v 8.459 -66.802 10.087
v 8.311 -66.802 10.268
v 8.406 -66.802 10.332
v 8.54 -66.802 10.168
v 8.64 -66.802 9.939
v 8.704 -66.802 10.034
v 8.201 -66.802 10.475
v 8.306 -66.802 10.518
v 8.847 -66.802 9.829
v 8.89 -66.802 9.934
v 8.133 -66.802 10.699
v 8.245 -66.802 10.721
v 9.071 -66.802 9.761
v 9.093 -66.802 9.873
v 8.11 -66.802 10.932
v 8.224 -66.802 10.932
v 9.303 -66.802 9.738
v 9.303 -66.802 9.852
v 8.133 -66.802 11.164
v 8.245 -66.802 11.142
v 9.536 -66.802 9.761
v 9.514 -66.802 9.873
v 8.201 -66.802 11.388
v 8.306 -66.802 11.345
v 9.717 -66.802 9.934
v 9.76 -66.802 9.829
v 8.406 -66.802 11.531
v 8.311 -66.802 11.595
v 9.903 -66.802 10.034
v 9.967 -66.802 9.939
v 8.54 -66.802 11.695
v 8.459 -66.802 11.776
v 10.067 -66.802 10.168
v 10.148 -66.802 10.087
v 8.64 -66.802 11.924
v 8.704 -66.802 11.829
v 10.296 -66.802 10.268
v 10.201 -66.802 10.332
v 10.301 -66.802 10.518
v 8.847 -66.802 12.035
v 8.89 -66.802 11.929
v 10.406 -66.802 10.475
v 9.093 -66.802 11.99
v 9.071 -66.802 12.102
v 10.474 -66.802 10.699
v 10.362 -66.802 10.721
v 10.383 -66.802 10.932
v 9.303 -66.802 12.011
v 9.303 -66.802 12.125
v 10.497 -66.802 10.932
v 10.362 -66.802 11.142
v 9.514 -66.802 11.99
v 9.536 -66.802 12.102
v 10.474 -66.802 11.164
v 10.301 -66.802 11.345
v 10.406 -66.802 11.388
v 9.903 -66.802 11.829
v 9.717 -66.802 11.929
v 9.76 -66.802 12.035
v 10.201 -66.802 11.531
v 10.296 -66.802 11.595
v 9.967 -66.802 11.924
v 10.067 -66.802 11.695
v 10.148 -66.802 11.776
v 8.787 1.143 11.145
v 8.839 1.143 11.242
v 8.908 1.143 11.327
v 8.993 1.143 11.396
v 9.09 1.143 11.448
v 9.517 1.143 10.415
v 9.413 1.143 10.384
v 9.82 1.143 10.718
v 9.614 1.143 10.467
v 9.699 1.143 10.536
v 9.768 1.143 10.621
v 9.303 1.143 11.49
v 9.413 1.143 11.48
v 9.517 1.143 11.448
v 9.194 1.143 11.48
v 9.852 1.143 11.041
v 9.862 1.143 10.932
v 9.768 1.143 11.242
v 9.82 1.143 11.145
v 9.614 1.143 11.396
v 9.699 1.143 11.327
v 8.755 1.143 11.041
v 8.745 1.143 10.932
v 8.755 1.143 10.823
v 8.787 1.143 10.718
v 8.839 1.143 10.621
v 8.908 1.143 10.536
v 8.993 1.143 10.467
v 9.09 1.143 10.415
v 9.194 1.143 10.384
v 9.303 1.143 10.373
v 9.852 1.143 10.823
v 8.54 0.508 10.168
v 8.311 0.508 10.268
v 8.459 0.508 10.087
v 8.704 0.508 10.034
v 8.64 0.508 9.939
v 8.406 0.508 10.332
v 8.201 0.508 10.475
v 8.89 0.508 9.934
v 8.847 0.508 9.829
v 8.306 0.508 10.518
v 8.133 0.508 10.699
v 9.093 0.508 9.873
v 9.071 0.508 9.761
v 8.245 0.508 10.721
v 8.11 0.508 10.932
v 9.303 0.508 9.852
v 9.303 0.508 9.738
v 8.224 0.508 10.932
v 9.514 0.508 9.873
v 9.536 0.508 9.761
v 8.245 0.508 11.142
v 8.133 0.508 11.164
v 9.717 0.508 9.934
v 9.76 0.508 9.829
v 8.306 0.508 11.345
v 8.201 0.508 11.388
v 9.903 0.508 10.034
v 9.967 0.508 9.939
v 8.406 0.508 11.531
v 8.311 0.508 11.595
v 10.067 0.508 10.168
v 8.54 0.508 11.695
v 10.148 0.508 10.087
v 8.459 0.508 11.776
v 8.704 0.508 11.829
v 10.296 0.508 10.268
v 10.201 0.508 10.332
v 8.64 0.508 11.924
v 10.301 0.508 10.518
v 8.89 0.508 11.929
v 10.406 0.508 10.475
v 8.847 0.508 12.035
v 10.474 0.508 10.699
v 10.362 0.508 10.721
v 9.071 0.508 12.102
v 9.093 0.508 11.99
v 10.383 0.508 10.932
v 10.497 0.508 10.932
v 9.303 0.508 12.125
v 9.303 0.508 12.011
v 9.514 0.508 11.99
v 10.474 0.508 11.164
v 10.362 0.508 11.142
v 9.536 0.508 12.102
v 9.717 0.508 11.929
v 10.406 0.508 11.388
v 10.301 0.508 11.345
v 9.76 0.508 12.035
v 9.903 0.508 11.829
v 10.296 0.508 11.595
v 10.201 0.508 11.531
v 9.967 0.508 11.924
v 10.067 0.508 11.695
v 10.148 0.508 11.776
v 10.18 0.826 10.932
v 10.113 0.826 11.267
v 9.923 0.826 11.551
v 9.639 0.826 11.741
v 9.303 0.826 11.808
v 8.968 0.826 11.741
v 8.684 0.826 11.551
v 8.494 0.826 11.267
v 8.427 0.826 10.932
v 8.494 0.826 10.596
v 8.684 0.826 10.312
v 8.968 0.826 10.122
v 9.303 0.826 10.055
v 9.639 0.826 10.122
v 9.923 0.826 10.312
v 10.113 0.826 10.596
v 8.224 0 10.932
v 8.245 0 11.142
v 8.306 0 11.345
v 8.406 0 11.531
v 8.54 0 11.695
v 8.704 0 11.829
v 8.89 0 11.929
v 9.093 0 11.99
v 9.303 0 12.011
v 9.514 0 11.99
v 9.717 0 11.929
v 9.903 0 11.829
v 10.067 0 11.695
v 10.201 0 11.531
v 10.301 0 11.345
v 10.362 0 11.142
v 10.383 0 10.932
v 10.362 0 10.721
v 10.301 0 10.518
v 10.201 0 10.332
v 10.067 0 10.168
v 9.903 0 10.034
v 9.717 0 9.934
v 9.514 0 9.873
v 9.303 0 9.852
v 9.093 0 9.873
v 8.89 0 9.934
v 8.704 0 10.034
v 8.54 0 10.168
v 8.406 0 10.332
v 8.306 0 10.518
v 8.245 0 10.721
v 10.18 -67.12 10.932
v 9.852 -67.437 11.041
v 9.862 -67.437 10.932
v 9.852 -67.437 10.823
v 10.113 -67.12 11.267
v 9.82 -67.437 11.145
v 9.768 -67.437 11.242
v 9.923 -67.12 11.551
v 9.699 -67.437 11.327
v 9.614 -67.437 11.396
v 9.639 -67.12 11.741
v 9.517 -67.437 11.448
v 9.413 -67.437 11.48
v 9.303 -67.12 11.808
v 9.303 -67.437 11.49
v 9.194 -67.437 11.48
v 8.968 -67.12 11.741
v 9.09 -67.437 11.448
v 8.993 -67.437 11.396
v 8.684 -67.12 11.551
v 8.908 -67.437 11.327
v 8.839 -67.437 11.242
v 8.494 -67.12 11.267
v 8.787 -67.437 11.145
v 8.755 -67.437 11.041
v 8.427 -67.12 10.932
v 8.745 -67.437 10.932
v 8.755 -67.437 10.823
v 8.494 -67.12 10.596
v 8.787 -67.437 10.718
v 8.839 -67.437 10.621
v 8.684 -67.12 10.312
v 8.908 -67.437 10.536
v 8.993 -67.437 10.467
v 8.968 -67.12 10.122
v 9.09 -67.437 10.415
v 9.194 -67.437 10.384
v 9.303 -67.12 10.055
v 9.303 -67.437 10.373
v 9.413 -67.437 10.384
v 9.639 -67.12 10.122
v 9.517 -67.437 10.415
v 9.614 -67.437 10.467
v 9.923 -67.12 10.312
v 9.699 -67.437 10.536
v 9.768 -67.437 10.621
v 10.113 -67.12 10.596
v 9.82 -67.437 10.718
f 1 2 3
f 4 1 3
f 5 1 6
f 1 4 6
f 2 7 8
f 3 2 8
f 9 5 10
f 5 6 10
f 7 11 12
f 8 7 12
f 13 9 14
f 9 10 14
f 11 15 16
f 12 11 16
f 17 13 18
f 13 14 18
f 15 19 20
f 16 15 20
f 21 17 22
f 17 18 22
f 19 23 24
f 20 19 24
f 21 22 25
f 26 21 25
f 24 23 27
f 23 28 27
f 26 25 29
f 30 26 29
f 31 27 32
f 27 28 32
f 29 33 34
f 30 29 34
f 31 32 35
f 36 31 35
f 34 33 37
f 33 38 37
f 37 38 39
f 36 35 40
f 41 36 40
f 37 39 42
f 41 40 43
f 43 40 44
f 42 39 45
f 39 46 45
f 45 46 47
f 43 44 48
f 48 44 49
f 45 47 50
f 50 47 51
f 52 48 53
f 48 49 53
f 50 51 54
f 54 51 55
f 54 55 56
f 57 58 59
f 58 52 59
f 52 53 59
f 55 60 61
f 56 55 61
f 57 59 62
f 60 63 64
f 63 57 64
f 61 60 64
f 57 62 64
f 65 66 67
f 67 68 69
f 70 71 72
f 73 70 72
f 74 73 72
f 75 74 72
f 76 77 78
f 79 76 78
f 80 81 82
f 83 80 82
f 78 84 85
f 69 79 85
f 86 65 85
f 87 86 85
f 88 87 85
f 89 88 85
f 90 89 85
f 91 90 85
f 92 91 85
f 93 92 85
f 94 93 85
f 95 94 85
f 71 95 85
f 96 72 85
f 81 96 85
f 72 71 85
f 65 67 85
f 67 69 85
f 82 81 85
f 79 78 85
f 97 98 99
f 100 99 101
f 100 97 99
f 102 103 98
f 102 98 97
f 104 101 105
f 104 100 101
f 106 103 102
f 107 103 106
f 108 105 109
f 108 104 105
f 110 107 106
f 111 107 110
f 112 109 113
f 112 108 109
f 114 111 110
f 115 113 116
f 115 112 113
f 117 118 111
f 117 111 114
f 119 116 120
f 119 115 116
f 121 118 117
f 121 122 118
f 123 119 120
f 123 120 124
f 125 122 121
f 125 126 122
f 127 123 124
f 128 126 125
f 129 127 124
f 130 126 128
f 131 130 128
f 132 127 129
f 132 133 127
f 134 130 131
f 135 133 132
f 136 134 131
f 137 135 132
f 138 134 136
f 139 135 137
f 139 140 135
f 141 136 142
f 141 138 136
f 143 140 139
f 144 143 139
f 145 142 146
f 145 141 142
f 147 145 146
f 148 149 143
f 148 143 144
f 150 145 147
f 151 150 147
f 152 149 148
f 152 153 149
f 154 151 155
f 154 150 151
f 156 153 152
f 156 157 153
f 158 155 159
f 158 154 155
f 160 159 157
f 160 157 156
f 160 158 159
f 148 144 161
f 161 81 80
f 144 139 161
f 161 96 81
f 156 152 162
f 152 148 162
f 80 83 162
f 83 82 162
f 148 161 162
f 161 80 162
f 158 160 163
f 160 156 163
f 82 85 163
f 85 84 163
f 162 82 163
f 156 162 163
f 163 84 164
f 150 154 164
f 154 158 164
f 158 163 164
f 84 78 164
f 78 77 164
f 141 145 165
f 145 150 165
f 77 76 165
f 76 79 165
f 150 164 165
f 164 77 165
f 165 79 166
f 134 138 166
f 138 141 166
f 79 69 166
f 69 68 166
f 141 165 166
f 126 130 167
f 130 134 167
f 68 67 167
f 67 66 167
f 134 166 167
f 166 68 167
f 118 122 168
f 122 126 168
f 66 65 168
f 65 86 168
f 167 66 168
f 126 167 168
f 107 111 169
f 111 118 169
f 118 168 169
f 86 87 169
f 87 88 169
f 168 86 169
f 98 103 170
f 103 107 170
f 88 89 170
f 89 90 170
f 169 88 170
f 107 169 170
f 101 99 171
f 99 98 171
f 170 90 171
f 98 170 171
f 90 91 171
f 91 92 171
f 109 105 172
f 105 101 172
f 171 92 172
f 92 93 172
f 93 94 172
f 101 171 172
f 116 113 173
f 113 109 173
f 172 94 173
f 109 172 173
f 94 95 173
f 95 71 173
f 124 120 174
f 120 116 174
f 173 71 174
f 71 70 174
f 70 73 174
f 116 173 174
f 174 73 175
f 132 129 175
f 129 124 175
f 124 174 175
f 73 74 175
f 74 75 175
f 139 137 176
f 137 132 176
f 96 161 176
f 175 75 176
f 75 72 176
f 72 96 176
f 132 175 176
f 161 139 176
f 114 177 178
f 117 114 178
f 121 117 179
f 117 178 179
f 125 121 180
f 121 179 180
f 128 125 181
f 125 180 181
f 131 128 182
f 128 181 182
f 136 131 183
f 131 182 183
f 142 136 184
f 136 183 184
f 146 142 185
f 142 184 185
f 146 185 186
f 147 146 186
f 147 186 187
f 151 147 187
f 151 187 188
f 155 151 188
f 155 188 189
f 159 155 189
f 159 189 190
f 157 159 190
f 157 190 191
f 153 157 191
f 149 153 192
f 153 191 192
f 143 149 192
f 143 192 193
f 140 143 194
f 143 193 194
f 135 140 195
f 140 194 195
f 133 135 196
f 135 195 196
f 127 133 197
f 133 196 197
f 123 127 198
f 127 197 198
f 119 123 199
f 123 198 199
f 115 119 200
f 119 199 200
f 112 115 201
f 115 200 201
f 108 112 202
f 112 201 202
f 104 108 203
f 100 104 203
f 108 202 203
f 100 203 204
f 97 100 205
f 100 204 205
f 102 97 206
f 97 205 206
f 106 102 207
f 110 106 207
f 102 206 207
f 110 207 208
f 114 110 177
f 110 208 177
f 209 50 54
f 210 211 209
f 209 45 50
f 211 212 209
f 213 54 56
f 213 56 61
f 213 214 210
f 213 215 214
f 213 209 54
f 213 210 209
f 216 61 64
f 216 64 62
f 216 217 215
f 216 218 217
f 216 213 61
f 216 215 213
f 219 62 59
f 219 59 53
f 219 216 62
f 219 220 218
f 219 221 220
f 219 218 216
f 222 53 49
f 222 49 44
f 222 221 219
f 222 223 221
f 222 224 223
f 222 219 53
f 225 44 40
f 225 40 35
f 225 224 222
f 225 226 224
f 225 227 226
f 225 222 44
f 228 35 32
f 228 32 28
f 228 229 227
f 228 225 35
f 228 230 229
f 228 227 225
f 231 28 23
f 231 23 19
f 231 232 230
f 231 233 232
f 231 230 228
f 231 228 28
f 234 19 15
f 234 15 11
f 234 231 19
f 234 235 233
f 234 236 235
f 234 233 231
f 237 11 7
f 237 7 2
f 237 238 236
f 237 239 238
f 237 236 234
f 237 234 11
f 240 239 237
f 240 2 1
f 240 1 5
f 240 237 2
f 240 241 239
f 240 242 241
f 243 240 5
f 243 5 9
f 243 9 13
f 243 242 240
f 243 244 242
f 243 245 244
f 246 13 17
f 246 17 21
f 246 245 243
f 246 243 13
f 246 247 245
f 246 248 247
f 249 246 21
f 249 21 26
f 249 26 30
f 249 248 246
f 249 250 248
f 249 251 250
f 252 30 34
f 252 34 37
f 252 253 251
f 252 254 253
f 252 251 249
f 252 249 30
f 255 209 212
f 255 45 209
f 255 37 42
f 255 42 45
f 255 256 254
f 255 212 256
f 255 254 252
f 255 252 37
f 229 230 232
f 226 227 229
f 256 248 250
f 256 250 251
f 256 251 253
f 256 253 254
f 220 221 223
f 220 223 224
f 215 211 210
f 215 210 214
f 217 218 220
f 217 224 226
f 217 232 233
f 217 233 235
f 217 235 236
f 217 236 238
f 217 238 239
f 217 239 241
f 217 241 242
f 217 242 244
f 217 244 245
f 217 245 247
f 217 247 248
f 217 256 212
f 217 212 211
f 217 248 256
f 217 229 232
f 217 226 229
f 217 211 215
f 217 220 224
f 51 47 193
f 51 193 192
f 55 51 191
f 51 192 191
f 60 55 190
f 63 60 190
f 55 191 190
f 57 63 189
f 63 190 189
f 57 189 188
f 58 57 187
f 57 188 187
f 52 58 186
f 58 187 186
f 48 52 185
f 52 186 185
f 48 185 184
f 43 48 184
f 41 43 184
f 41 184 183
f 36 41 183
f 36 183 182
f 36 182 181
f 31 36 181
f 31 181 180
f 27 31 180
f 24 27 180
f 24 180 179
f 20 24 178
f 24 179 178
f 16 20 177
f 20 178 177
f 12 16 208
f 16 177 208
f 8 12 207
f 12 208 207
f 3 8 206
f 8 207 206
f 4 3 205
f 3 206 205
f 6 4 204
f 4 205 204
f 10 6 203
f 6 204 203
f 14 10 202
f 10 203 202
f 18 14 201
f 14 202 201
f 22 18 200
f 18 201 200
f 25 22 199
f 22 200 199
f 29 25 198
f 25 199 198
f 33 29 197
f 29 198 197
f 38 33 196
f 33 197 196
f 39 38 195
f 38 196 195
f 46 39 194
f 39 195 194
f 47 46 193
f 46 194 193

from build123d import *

# Parameters (mm, degrees)
F0_R     = 1.0795
F1_DEPTH = 66.802
F2_R     = 1.0795
F3_DEPTH = 0.508
F4_R     = 1.2446
F4_R_2   = 1.0795
F5_DEPTH = 0.635


# Not quite as in the source:
# - a fillet or chamfer that OpenCascade refuses, or shapes differently, is made with other operations: its cross-section is extruded or revolved along the edge and cut away or added
# - two fillets or chamfers of one size are made in one step
# - a feature of the source that left no trace in its solid (it failed there, or was rolled back) is left out
# - a pattern or mirror of a feature is missing from the dataset's text; its kind, count and spacing are read off the source's solid


with BuildPart() as f1:
    # F0 (on Front) → F1 (new body)
    with BuildSketch(Plane.XZ):
        with Locations((9.3034878373, 10.9315989539)):
            Circle(F0_R)
    extrude(amount=F1_DEPTH)

    # F2 (on face) → F3 (join)
    with BuildSketch(Plane(origin=(0, 0, 0), x_dir=(-1, 0, 0), z_dir=(0, 1, 0))):
        with Locations((-9.3034878373, 10.9315989539)):
            Circle(F2_R)
    extrude(amount=F3_DEPTH)

    # F4 (on face) → F5 (join)
    with BuildSketch(Plane.XZ.offset(66.802)):
        with Locations((9.3034878373, 10.9315989539)):
            Circle(F4_R)
        with Locations((9.3034878373, 10.9315989539)):
            Circle(F4_R_2, mode=Mode.SUBTRACT)
        with Locations((9.3034878373, 10.9315989539)):
            Circle(F4_R_2)
    f5 = extrude(amount=F5_DEPTH)

    # F5_copies: F5 across plane
    add(f5.mirror(Plane.ZX.offset(-33.147)))

    # F8: chamfer of 0.6858 on 2 edges, made by hand

    # F8_s1 → F8_t2 (revolve, cut)
    with BuildSketch(Plane.XY.offset(10.9315989539)):
        Polygon((10.5480878373, 0.4572), (9.8622878373, 1.143), (10.5480878373, 1.143), align=None)
    revolve(axis=Axis((9.3034878373, 1.143, 10.9315989539), (0, -1, 0)), mode=Mode.SUBTRACT)

    # F8_s3 → F8_t4 (revolve, cut)
    with BuildSketch(Plane.XY.offset(10.9315989539)):
        Polygon((10.5480878373, -66.7512), (9.8622878373, -67.437), (10.5480878373, -67.437), align=None)
    revolve(axis=Axis((9.3034878373, -67.437, 10.9315989539), (0, -1, 0)), mode=Mode.SUBTRACT)


solid = f1.part
